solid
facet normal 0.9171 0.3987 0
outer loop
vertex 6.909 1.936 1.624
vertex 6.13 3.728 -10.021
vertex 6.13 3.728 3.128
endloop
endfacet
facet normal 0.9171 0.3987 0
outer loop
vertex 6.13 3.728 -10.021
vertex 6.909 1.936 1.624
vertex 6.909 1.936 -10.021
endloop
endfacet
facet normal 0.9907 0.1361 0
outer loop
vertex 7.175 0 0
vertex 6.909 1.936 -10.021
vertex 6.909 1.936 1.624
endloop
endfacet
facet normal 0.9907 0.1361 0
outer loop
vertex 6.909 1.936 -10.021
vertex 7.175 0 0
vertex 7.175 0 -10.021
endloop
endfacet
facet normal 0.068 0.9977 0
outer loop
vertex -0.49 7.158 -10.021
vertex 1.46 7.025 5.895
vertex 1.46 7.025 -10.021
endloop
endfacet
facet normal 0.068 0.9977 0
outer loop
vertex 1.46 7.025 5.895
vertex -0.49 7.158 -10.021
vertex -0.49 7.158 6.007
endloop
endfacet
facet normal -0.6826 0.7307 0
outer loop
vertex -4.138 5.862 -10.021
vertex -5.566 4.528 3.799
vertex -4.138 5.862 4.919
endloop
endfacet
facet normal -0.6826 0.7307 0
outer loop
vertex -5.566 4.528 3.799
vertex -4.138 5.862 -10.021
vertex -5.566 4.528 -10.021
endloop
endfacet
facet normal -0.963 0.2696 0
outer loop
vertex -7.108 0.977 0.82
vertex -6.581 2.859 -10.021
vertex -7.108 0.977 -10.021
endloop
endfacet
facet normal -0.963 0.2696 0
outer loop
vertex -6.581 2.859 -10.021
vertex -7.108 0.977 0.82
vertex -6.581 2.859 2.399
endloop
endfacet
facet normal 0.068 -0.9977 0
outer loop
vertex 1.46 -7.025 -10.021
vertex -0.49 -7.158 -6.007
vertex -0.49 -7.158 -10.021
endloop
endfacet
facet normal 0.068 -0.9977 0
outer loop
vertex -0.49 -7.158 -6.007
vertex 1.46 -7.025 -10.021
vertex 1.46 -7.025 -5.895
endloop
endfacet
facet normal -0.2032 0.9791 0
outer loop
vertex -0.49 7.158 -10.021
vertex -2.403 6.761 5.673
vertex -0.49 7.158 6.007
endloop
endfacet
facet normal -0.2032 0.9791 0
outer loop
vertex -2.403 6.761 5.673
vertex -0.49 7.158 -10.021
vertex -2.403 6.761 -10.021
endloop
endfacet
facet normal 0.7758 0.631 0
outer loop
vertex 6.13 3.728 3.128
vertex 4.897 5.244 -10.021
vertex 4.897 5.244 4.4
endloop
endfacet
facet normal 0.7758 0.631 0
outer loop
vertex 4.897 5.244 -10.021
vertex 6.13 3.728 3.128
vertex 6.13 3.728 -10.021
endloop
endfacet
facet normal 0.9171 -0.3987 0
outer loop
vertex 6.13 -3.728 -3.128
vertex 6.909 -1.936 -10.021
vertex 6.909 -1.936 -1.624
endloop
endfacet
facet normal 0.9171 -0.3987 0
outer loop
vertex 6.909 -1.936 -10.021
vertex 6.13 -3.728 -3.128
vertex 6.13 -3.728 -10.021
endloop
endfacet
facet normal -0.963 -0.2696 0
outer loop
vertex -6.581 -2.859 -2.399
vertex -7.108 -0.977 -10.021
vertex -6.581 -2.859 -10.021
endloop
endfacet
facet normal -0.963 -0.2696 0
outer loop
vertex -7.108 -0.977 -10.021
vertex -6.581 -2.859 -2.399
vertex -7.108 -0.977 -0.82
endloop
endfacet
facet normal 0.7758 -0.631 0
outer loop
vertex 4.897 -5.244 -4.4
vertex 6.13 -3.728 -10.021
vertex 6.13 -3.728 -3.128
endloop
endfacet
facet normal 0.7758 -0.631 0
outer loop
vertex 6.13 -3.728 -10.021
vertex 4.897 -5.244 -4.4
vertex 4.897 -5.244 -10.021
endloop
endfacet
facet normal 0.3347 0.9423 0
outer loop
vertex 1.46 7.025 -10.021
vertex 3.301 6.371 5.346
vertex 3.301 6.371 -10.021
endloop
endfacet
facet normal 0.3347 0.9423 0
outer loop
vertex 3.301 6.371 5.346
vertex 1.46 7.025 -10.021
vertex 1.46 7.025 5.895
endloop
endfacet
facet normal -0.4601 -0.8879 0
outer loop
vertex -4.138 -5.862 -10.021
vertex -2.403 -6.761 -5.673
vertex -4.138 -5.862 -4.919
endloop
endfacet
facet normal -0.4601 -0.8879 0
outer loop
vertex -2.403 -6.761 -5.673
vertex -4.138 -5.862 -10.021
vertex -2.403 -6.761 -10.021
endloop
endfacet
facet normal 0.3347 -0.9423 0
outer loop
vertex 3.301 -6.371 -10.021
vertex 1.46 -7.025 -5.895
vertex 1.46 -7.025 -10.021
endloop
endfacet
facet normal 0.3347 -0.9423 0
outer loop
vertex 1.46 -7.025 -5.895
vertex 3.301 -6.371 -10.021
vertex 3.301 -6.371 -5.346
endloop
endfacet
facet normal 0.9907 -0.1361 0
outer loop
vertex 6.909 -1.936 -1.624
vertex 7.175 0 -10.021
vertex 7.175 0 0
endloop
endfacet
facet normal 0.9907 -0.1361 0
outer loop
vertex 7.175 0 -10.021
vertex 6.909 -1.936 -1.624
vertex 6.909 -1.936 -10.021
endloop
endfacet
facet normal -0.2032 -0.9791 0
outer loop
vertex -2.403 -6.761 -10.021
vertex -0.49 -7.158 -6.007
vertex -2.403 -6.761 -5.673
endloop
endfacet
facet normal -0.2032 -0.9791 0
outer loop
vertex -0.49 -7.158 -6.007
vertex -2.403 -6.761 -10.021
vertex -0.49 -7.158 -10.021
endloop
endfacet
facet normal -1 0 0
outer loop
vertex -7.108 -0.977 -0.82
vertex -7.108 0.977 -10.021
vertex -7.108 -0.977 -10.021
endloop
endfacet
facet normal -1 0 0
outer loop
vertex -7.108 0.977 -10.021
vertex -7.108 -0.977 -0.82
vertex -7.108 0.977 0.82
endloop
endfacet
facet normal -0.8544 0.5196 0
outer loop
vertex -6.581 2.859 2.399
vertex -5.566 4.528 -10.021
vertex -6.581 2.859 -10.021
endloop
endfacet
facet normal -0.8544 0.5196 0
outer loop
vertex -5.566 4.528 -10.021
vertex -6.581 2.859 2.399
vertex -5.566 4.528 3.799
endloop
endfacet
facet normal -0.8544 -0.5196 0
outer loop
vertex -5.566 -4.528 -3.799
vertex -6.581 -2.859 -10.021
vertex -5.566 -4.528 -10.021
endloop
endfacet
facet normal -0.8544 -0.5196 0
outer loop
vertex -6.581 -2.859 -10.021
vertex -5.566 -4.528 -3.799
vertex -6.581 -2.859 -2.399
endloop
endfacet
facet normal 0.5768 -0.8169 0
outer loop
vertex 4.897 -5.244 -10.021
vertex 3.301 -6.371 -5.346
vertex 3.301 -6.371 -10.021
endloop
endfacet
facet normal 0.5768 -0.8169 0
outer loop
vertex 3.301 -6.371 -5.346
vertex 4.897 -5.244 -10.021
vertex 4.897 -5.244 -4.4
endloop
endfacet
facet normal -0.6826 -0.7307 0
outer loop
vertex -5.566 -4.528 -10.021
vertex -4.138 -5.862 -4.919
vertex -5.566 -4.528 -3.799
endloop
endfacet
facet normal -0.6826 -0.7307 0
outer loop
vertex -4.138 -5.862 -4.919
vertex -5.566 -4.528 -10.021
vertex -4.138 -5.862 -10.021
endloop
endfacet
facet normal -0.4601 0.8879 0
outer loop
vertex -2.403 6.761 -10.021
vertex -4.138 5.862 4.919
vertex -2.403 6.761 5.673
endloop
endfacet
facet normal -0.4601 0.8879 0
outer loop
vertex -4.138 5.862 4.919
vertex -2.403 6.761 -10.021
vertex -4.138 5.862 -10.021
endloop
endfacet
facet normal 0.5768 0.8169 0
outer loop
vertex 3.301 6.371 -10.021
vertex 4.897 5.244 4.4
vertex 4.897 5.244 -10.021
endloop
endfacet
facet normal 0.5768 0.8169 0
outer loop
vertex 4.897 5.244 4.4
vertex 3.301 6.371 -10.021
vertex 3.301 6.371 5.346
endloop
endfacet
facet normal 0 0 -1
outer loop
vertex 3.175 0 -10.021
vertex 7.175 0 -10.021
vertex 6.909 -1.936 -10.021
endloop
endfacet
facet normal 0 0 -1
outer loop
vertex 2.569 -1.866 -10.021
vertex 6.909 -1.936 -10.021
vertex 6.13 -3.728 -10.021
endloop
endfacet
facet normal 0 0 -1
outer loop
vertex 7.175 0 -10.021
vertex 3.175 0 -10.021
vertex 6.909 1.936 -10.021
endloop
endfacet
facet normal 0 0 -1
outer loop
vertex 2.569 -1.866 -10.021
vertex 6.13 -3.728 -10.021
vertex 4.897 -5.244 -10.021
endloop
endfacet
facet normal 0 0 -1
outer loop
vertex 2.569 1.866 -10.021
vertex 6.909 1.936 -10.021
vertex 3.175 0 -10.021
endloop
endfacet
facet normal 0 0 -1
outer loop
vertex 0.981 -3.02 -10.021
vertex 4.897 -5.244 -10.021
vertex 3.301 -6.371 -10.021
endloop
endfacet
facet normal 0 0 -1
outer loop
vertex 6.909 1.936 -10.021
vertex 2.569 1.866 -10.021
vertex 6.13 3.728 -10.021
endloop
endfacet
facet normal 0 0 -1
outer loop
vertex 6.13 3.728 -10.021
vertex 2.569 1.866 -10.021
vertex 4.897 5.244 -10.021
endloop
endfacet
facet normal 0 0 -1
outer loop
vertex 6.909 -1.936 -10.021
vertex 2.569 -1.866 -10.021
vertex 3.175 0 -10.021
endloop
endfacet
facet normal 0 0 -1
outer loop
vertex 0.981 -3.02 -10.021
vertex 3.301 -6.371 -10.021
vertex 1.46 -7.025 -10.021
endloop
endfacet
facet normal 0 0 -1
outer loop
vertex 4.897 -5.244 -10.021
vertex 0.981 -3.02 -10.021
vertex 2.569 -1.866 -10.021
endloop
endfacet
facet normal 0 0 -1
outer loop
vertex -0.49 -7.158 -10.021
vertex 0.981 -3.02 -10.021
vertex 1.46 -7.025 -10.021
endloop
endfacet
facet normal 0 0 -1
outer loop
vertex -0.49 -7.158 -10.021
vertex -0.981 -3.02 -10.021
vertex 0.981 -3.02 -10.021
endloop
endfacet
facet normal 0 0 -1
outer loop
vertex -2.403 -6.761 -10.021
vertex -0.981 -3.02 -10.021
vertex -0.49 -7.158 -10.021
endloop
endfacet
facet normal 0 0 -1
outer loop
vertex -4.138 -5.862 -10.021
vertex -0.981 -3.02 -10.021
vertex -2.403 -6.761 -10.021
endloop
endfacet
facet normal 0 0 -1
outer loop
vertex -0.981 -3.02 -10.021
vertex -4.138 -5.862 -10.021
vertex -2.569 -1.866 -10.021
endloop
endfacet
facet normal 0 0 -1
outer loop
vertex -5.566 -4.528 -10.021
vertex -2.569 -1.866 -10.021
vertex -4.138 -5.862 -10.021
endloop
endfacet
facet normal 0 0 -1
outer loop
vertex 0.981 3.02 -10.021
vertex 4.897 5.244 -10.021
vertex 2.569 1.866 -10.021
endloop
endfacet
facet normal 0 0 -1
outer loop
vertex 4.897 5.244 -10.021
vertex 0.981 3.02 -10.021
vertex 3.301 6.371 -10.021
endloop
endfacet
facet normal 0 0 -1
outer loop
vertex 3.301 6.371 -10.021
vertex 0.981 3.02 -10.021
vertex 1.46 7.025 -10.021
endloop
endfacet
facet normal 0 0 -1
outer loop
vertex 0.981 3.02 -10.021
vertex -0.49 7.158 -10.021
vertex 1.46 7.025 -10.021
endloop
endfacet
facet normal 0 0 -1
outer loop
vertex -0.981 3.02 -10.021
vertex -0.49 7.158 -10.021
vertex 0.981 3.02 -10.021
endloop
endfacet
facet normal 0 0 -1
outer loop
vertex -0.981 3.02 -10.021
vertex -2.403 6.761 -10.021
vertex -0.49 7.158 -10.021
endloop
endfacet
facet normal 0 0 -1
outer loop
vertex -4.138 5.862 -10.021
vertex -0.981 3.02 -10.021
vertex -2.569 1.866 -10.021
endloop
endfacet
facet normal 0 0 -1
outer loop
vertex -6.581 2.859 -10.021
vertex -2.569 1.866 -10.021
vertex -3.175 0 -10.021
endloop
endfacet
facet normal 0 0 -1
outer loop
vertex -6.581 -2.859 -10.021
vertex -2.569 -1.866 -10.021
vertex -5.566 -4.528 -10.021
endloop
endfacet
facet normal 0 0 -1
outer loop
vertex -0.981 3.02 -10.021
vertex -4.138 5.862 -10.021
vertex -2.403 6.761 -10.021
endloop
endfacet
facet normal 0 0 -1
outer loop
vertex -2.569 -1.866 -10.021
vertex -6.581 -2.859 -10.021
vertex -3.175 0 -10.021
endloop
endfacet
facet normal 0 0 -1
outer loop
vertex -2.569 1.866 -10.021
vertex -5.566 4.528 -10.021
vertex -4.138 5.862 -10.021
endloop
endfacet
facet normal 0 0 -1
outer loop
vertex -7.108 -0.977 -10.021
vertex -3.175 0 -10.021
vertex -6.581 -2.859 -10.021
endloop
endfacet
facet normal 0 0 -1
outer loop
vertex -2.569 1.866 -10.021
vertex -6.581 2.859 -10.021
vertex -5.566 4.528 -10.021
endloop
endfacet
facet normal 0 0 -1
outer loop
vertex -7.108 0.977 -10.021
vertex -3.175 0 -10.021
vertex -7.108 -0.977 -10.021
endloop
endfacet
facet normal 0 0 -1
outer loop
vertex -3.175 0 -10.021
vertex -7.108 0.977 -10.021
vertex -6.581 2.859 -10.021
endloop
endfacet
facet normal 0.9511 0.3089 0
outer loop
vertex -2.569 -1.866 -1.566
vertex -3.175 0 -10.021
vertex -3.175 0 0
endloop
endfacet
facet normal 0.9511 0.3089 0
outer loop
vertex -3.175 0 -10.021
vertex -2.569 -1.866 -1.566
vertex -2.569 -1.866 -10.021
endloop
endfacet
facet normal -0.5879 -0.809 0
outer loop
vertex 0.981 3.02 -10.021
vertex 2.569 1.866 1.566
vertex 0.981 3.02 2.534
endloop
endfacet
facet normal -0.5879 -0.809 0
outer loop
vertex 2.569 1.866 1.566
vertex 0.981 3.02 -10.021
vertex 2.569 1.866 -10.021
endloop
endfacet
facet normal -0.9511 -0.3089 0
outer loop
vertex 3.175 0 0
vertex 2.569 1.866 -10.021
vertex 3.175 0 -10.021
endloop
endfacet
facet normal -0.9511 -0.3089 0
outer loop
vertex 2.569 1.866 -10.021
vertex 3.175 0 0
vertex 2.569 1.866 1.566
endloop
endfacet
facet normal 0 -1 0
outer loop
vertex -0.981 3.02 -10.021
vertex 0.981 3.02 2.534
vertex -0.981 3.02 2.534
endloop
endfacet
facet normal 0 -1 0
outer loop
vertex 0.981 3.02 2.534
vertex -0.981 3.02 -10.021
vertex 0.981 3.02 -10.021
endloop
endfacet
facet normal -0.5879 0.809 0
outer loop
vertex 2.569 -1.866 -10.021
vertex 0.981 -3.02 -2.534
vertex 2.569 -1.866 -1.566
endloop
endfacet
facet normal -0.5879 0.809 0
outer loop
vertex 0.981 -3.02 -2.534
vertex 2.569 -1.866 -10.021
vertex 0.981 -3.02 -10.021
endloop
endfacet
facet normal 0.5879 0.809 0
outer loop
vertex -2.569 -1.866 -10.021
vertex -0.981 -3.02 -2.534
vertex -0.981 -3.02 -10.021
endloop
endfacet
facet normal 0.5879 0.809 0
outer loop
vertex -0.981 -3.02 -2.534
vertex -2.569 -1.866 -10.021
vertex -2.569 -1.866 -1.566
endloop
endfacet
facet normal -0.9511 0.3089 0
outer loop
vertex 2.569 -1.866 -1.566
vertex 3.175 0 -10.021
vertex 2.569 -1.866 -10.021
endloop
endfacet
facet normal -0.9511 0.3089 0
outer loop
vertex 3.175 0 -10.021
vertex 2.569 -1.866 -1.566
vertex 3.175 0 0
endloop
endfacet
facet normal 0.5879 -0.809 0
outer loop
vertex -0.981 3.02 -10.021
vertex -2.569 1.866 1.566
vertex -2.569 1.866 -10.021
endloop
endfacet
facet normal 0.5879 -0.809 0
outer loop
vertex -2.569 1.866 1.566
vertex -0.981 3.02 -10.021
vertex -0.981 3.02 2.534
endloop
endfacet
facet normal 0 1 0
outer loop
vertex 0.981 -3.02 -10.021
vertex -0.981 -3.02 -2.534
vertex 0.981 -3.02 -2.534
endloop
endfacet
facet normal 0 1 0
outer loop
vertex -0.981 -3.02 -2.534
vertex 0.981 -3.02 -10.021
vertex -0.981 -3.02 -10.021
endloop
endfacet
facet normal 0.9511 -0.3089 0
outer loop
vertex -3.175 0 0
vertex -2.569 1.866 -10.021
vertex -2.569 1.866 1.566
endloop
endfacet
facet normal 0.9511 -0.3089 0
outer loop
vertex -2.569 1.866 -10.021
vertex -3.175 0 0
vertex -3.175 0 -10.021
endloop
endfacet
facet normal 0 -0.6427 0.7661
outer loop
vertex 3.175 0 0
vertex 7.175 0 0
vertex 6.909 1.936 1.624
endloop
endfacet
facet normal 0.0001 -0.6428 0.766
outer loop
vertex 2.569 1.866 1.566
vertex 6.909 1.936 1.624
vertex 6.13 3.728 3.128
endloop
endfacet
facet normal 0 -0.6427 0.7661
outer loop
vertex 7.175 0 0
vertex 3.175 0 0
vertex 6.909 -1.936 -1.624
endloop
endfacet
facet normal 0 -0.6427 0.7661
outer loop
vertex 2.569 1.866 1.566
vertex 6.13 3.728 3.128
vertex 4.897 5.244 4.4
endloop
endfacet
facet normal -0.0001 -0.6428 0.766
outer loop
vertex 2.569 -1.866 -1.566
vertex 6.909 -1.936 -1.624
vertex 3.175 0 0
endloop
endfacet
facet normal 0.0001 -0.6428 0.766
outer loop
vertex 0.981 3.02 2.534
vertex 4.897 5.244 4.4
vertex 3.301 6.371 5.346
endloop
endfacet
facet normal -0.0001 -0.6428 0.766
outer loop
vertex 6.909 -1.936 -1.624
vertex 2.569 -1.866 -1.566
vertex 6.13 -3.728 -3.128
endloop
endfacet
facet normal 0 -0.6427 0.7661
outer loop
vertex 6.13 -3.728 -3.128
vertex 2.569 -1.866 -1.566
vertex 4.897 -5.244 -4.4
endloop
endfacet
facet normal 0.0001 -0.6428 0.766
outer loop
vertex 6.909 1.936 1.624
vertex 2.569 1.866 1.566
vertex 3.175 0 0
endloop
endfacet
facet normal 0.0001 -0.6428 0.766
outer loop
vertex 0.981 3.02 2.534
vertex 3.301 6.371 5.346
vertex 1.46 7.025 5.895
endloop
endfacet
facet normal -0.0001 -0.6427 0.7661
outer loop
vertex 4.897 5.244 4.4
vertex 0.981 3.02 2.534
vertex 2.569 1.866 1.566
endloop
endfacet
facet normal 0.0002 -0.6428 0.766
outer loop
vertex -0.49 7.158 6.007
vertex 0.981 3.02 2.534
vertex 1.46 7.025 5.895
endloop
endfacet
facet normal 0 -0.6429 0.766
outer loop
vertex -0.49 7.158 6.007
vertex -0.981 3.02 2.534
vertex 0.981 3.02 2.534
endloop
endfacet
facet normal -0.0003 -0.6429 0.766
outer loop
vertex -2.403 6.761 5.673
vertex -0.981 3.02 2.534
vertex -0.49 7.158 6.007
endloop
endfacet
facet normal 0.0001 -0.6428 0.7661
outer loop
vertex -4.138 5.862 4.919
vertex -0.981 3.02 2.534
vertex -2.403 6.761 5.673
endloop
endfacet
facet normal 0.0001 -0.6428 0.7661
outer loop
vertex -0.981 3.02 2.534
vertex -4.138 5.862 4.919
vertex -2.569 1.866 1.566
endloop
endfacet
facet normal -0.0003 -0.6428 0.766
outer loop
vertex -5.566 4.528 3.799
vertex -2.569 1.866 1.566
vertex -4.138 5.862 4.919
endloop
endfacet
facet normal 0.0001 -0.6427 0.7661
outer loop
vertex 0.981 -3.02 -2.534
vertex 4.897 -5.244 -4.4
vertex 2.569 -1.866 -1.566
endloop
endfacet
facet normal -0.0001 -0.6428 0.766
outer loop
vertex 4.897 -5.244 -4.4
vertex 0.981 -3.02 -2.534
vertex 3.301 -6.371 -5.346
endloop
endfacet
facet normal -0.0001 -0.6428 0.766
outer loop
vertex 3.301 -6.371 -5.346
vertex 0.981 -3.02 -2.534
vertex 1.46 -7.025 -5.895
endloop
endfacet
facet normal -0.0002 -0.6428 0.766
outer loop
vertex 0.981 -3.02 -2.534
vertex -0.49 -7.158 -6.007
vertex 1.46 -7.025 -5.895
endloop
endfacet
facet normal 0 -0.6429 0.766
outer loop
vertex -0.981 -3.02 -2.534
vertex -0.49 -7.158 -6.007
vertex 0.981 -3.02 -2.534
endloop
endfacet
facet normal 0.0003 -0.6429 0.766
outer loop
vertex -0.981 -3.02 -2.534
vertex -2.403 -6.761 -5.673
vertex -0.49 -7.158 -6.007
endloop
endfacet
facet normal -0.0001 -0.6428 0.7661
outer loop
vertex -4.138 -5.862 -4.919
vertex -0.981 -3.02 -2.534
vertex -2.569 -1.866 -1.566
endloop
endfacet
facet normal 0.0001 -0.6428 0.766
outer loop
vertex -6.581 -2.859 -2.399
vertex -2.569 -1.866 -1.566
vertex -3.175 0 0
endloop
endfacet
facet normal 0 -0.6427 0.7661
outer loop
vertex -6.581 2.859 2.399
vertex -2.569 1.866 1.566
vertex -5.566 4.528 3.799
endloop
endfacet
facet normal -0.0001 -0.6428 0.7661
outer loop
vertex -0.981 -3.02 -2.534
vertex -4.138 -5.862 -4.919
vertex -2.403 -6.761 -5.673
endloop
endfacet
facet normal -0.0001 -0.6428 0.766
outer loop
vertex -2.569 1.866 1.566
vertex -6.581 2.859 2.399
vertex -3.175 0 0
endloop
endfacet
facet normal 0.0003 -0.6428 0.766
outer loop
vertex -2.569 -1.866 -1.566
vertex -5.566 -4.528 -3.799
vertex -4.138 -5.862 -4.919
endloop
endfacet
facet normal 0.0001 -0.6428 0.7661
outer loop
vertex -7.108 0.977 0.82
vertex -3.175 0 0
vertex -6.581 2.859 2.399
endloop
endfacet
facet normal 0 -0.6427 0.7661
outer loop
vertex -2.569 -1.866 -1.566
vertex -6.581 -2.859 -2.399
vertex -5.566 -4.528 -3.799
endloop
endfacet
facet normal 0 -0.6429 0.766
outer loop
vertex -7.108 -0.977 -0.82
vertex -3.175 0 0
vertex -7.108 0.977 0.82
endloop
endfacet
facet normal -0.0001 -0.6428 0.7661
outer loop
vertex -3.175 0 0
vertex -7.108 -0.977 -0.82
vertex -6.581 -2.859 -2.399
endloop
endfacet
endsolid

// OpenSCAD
// file: medidas.scad
DIAMETER_THREADED_ROD = 6.35;
THREADED_ROD_NUT_HEIGTH = 6;
DISTANCE_BETWEN_THREADED_ROD = 50;

RAMP_ANGLE = 40;
RAMP_WALL_HEIGTH = 100;
RAMP_WIDTH = 310;
RAMP_LENGTH = 300;

ARRUELA_INCLINADA_WALL_THICKNESS = 4;
ARRUELA_INCLINADA_EXTRA_HEIGHT = 4;

ACRYLIC_THICKNESS = 3;

BASE_WIDTH = 80;
BASE_LENGTH = 450;
BASE_HOLE_DISTANCE = 8;

MINIMUM_DISTANCE_RAMP_BASE = 40;

FUNNEL_ANGLE = 30;


//1- MOTOR PIECE WITH BIGGER DIAMETER, 2- MOTOR PIECE WITH SMALLER DIAMETER
MOTOR_DIAMETER1 = 38.05;
MOTOR_DIAMETER2 = 35.70;
MOTOR_LENGTH1 = 24.65;
MOTOR_LENGTH2 = 31.25;
MOTOR_SHAFT_LENGTH = 21;
MOTOR_SHAFT_DIAMETER = 6;
MOTOR_LARGE_SHAFT_DIAMETER = 12.2;
MOTOR_SCREW_SUPORT_DIAMETER = 3;
MOTOR_SCREW_MOTOR_DIAMETER = 3;
MOTOR_ZIPLOCK_THICKNESS = 3;
MOTOR_ZIPLOCK_WIDITH = 4;
MOTOR_BIGGER_SHAFT_LENGTH = 30;
MOTOR_SHAFT_DIAMETER_CUT = 5;

WHEEL_WIDTH = 70;
WHEEL_DIAMETER = 100;

DISTANCE_BASE_FLOOR = 70;

FRONT_MOTOR_DISTANCE = 100;
BACK_MOTOR_DISTANCE = 70;
VASSOURA_HEIGHT = 60;
// main file
include <medidas.scad>

module hollowTube(outterDiameter, innerDiameter, height)
{
	difference()
	{
		cylinder(r=outterDiameter/2, h=height, center=true);	

		cylinder(r=innerDiameter/2, h=height+2, center=true);	
	}
}

module arruelaInclinadaParam(diameter, angle)
{
	innerDiameter = diameter;
	outterDiameter = diameter+2*ARRUELA_INCLINADA_WALL_THICKNESS;
	height = outterDiameter*tan(angle) + 2*ARRUELA_INCLINADA_EXTRA_HEIGHT;
	negativeCube = max(height*2, outterDiameter*2);
	h = 0;

	difference()
	{
		hollowTube(outterDiameter, innerDiameter, height);
		
		translate([0,0,h])
		{
			rotate([angle, 0, 0])
			{
				translate([0,0,negativeCube/2])
				{
					cube([negativeCube,negativeCube,negativeCube], center=true);
				}
			}
		}
	}
}

module arruelaInclinada()
{
	color([1,0.4,0])
	{
		arruelaInclinadaParam(DIAMETER_THREADED_ROD, RAMP_ANGLE);
	}
}

arruelaInclinada();
